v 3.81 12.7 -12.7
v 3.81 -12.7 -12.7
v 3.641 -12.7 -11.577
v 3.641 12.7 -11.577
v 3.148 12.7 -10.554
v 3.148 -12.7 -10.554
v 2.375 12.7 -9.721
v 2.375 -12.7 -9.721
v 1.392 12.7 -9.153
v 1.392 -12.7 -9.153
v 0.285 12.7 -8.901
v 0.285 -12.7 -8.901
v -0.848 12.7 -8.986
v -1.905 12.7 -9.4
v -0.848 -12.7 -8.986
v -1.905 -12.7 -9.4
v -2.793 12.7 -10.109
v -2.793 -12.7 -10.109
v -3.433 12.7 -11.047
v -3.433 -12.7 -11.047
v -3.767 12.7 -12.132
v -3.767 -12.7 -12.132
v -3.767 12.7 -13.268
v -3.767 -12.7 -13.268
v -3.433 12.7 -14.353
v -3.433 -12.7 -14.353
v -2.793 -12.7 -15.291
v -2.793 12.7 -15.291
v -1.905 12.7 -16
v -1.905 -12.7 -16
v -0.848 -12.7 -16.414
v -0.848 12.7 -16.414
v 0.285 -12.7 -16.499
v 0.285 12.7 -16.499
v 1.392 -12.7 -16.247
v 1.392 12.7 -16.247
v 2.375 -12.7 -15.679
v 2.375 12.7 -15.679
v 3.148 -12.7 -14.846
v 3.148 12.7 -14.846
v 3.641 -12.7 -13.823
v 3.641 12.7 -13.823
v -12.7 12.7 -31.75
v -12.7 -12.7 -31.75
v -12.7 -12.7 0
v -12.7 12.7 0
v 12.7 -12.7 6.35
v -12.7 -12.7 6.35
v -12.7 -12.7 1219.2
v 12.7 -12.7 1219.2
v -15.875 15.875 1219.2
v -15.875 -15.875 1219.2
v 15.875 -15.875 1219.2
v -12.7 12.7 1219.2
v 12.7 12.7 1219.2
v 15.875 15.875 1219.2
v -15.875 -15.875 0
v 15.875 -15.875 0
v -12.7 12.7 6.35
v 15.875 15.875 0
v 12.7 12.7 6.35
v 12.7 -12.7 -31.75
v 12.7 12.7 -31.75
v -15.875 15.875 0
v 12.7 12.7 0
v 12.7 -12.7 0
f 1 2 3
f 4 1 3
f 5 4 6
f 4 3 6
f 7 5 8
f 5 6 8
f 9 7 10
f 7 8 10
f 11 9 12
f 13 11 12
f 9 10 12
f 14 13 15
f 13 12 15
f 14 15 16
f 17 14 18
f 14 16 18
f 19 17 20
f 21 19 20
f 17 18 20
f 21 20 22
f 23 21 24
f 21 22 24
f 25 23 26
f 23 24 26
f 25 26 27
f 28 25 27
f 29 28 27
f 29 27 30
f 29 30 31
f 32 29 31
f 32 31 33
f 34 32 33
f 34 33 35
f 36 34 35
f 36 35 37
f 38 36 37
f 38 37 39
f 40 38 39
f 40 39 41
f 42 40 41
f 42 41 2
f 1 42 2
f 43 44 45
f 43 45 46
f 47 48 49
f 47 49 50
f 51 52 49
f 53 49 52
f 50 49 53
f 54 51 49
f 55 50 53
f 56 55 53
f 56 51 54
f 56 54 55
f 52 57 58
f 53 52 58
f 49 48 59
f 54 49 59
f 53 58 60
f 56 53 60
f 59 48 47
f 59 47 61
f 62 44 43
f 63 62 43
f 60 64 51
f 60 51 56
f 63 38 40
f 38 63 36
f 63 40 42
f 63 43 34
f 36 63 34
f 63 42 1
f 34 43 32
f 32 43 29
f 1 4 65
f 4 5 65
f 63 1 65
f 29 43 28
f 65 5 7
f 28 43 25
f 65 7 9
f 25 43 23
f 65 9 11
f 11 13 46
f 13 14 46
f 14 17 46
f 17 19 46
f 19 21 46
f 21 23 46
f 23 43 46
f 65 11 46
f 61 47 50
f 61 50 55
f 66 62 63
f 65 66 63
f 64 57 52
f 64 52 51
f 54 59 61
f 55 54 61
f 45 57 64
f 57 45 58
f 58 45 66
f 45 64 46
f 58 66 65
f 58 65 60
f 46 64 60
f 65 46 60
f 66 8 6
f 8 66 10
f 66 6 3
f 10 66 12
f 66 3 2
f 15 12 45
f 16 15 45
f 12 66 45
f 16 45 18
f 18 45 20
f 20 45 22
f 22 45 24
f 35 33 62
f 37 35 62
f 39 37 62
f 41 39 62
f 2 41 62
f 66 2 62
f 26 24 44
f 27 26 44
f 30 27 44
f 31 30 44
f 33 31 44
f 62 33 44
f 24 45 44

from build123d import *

# Parameters (mm, degrees)
F0_W      = 31.75
F0_H      = 31.75
F0_W_2    = 25.4
F0_H_2    = 25.4
F1_DEPTH  = 1219.2
F2_W      = 25.4
F2_H      = 25.4
F3_DEPTH  = 31.75
F4_R      = 3.81
F5_DEPTH  = 28.576
F7_W      = 25.4
F7_H      = 6.35
F7_H_2    = 31.75
F8_DEPTH  = 25.4
F9_R      = 3.81
F10_DEPTH = 28.576


with BuildPart() as f1:
    # F0 (on Top) → F1 (new body)
    with BuildSketch(Plane.XY):
        Rectangle(F0_W, F0_H)
        Rectangle(F0_W_2, F0_H_2, mode=Mode.SUBTRACT)
    extrude(amount=F1_DEPTH)

    # F7 (on face) → F8 (join)
    with BuildSketch(Plane.YZ.offset(-12.7)):
        with Locations((0, 3.175)):
            Rectangle(F7_W, F7_H)
        with Locations((0, -15.875)):
            Rectangle(F7_W, F7_H_2)
    extrude(amount=F8_DEPTH)

    # F9 (on face) → F10 (cut, through all)
    with BuildSketch(Plane.XZ.offset(12.7)):
        with Locations((0, -12.7)):
            Circle(F9_R)
    extrude(amount=-F10_DEPTH, mode=Mode.SUBTRACT)


with BuildPart() as f3:
    # F2 (on face) → F3 (new body)
    with BuildSketch(Plane(origin=(0, 0, 0), x_dir=(1, 0, 0), z_dir=(0, 0, -1))):
        Rectangle(F2_W, F2_H)
    extrude(amount=F3_DEPTH)

    # F4 (on face) → F5 (cut, through all)
    with BuildSketch(Plane.XZ.offset(12.7)):
        with Locations((0, -12.7)):
            Circle(F4_R)
    extrude(amount=-F5_DEPTH, mode=Mode.SUBTRACT)


solid = f1.part
